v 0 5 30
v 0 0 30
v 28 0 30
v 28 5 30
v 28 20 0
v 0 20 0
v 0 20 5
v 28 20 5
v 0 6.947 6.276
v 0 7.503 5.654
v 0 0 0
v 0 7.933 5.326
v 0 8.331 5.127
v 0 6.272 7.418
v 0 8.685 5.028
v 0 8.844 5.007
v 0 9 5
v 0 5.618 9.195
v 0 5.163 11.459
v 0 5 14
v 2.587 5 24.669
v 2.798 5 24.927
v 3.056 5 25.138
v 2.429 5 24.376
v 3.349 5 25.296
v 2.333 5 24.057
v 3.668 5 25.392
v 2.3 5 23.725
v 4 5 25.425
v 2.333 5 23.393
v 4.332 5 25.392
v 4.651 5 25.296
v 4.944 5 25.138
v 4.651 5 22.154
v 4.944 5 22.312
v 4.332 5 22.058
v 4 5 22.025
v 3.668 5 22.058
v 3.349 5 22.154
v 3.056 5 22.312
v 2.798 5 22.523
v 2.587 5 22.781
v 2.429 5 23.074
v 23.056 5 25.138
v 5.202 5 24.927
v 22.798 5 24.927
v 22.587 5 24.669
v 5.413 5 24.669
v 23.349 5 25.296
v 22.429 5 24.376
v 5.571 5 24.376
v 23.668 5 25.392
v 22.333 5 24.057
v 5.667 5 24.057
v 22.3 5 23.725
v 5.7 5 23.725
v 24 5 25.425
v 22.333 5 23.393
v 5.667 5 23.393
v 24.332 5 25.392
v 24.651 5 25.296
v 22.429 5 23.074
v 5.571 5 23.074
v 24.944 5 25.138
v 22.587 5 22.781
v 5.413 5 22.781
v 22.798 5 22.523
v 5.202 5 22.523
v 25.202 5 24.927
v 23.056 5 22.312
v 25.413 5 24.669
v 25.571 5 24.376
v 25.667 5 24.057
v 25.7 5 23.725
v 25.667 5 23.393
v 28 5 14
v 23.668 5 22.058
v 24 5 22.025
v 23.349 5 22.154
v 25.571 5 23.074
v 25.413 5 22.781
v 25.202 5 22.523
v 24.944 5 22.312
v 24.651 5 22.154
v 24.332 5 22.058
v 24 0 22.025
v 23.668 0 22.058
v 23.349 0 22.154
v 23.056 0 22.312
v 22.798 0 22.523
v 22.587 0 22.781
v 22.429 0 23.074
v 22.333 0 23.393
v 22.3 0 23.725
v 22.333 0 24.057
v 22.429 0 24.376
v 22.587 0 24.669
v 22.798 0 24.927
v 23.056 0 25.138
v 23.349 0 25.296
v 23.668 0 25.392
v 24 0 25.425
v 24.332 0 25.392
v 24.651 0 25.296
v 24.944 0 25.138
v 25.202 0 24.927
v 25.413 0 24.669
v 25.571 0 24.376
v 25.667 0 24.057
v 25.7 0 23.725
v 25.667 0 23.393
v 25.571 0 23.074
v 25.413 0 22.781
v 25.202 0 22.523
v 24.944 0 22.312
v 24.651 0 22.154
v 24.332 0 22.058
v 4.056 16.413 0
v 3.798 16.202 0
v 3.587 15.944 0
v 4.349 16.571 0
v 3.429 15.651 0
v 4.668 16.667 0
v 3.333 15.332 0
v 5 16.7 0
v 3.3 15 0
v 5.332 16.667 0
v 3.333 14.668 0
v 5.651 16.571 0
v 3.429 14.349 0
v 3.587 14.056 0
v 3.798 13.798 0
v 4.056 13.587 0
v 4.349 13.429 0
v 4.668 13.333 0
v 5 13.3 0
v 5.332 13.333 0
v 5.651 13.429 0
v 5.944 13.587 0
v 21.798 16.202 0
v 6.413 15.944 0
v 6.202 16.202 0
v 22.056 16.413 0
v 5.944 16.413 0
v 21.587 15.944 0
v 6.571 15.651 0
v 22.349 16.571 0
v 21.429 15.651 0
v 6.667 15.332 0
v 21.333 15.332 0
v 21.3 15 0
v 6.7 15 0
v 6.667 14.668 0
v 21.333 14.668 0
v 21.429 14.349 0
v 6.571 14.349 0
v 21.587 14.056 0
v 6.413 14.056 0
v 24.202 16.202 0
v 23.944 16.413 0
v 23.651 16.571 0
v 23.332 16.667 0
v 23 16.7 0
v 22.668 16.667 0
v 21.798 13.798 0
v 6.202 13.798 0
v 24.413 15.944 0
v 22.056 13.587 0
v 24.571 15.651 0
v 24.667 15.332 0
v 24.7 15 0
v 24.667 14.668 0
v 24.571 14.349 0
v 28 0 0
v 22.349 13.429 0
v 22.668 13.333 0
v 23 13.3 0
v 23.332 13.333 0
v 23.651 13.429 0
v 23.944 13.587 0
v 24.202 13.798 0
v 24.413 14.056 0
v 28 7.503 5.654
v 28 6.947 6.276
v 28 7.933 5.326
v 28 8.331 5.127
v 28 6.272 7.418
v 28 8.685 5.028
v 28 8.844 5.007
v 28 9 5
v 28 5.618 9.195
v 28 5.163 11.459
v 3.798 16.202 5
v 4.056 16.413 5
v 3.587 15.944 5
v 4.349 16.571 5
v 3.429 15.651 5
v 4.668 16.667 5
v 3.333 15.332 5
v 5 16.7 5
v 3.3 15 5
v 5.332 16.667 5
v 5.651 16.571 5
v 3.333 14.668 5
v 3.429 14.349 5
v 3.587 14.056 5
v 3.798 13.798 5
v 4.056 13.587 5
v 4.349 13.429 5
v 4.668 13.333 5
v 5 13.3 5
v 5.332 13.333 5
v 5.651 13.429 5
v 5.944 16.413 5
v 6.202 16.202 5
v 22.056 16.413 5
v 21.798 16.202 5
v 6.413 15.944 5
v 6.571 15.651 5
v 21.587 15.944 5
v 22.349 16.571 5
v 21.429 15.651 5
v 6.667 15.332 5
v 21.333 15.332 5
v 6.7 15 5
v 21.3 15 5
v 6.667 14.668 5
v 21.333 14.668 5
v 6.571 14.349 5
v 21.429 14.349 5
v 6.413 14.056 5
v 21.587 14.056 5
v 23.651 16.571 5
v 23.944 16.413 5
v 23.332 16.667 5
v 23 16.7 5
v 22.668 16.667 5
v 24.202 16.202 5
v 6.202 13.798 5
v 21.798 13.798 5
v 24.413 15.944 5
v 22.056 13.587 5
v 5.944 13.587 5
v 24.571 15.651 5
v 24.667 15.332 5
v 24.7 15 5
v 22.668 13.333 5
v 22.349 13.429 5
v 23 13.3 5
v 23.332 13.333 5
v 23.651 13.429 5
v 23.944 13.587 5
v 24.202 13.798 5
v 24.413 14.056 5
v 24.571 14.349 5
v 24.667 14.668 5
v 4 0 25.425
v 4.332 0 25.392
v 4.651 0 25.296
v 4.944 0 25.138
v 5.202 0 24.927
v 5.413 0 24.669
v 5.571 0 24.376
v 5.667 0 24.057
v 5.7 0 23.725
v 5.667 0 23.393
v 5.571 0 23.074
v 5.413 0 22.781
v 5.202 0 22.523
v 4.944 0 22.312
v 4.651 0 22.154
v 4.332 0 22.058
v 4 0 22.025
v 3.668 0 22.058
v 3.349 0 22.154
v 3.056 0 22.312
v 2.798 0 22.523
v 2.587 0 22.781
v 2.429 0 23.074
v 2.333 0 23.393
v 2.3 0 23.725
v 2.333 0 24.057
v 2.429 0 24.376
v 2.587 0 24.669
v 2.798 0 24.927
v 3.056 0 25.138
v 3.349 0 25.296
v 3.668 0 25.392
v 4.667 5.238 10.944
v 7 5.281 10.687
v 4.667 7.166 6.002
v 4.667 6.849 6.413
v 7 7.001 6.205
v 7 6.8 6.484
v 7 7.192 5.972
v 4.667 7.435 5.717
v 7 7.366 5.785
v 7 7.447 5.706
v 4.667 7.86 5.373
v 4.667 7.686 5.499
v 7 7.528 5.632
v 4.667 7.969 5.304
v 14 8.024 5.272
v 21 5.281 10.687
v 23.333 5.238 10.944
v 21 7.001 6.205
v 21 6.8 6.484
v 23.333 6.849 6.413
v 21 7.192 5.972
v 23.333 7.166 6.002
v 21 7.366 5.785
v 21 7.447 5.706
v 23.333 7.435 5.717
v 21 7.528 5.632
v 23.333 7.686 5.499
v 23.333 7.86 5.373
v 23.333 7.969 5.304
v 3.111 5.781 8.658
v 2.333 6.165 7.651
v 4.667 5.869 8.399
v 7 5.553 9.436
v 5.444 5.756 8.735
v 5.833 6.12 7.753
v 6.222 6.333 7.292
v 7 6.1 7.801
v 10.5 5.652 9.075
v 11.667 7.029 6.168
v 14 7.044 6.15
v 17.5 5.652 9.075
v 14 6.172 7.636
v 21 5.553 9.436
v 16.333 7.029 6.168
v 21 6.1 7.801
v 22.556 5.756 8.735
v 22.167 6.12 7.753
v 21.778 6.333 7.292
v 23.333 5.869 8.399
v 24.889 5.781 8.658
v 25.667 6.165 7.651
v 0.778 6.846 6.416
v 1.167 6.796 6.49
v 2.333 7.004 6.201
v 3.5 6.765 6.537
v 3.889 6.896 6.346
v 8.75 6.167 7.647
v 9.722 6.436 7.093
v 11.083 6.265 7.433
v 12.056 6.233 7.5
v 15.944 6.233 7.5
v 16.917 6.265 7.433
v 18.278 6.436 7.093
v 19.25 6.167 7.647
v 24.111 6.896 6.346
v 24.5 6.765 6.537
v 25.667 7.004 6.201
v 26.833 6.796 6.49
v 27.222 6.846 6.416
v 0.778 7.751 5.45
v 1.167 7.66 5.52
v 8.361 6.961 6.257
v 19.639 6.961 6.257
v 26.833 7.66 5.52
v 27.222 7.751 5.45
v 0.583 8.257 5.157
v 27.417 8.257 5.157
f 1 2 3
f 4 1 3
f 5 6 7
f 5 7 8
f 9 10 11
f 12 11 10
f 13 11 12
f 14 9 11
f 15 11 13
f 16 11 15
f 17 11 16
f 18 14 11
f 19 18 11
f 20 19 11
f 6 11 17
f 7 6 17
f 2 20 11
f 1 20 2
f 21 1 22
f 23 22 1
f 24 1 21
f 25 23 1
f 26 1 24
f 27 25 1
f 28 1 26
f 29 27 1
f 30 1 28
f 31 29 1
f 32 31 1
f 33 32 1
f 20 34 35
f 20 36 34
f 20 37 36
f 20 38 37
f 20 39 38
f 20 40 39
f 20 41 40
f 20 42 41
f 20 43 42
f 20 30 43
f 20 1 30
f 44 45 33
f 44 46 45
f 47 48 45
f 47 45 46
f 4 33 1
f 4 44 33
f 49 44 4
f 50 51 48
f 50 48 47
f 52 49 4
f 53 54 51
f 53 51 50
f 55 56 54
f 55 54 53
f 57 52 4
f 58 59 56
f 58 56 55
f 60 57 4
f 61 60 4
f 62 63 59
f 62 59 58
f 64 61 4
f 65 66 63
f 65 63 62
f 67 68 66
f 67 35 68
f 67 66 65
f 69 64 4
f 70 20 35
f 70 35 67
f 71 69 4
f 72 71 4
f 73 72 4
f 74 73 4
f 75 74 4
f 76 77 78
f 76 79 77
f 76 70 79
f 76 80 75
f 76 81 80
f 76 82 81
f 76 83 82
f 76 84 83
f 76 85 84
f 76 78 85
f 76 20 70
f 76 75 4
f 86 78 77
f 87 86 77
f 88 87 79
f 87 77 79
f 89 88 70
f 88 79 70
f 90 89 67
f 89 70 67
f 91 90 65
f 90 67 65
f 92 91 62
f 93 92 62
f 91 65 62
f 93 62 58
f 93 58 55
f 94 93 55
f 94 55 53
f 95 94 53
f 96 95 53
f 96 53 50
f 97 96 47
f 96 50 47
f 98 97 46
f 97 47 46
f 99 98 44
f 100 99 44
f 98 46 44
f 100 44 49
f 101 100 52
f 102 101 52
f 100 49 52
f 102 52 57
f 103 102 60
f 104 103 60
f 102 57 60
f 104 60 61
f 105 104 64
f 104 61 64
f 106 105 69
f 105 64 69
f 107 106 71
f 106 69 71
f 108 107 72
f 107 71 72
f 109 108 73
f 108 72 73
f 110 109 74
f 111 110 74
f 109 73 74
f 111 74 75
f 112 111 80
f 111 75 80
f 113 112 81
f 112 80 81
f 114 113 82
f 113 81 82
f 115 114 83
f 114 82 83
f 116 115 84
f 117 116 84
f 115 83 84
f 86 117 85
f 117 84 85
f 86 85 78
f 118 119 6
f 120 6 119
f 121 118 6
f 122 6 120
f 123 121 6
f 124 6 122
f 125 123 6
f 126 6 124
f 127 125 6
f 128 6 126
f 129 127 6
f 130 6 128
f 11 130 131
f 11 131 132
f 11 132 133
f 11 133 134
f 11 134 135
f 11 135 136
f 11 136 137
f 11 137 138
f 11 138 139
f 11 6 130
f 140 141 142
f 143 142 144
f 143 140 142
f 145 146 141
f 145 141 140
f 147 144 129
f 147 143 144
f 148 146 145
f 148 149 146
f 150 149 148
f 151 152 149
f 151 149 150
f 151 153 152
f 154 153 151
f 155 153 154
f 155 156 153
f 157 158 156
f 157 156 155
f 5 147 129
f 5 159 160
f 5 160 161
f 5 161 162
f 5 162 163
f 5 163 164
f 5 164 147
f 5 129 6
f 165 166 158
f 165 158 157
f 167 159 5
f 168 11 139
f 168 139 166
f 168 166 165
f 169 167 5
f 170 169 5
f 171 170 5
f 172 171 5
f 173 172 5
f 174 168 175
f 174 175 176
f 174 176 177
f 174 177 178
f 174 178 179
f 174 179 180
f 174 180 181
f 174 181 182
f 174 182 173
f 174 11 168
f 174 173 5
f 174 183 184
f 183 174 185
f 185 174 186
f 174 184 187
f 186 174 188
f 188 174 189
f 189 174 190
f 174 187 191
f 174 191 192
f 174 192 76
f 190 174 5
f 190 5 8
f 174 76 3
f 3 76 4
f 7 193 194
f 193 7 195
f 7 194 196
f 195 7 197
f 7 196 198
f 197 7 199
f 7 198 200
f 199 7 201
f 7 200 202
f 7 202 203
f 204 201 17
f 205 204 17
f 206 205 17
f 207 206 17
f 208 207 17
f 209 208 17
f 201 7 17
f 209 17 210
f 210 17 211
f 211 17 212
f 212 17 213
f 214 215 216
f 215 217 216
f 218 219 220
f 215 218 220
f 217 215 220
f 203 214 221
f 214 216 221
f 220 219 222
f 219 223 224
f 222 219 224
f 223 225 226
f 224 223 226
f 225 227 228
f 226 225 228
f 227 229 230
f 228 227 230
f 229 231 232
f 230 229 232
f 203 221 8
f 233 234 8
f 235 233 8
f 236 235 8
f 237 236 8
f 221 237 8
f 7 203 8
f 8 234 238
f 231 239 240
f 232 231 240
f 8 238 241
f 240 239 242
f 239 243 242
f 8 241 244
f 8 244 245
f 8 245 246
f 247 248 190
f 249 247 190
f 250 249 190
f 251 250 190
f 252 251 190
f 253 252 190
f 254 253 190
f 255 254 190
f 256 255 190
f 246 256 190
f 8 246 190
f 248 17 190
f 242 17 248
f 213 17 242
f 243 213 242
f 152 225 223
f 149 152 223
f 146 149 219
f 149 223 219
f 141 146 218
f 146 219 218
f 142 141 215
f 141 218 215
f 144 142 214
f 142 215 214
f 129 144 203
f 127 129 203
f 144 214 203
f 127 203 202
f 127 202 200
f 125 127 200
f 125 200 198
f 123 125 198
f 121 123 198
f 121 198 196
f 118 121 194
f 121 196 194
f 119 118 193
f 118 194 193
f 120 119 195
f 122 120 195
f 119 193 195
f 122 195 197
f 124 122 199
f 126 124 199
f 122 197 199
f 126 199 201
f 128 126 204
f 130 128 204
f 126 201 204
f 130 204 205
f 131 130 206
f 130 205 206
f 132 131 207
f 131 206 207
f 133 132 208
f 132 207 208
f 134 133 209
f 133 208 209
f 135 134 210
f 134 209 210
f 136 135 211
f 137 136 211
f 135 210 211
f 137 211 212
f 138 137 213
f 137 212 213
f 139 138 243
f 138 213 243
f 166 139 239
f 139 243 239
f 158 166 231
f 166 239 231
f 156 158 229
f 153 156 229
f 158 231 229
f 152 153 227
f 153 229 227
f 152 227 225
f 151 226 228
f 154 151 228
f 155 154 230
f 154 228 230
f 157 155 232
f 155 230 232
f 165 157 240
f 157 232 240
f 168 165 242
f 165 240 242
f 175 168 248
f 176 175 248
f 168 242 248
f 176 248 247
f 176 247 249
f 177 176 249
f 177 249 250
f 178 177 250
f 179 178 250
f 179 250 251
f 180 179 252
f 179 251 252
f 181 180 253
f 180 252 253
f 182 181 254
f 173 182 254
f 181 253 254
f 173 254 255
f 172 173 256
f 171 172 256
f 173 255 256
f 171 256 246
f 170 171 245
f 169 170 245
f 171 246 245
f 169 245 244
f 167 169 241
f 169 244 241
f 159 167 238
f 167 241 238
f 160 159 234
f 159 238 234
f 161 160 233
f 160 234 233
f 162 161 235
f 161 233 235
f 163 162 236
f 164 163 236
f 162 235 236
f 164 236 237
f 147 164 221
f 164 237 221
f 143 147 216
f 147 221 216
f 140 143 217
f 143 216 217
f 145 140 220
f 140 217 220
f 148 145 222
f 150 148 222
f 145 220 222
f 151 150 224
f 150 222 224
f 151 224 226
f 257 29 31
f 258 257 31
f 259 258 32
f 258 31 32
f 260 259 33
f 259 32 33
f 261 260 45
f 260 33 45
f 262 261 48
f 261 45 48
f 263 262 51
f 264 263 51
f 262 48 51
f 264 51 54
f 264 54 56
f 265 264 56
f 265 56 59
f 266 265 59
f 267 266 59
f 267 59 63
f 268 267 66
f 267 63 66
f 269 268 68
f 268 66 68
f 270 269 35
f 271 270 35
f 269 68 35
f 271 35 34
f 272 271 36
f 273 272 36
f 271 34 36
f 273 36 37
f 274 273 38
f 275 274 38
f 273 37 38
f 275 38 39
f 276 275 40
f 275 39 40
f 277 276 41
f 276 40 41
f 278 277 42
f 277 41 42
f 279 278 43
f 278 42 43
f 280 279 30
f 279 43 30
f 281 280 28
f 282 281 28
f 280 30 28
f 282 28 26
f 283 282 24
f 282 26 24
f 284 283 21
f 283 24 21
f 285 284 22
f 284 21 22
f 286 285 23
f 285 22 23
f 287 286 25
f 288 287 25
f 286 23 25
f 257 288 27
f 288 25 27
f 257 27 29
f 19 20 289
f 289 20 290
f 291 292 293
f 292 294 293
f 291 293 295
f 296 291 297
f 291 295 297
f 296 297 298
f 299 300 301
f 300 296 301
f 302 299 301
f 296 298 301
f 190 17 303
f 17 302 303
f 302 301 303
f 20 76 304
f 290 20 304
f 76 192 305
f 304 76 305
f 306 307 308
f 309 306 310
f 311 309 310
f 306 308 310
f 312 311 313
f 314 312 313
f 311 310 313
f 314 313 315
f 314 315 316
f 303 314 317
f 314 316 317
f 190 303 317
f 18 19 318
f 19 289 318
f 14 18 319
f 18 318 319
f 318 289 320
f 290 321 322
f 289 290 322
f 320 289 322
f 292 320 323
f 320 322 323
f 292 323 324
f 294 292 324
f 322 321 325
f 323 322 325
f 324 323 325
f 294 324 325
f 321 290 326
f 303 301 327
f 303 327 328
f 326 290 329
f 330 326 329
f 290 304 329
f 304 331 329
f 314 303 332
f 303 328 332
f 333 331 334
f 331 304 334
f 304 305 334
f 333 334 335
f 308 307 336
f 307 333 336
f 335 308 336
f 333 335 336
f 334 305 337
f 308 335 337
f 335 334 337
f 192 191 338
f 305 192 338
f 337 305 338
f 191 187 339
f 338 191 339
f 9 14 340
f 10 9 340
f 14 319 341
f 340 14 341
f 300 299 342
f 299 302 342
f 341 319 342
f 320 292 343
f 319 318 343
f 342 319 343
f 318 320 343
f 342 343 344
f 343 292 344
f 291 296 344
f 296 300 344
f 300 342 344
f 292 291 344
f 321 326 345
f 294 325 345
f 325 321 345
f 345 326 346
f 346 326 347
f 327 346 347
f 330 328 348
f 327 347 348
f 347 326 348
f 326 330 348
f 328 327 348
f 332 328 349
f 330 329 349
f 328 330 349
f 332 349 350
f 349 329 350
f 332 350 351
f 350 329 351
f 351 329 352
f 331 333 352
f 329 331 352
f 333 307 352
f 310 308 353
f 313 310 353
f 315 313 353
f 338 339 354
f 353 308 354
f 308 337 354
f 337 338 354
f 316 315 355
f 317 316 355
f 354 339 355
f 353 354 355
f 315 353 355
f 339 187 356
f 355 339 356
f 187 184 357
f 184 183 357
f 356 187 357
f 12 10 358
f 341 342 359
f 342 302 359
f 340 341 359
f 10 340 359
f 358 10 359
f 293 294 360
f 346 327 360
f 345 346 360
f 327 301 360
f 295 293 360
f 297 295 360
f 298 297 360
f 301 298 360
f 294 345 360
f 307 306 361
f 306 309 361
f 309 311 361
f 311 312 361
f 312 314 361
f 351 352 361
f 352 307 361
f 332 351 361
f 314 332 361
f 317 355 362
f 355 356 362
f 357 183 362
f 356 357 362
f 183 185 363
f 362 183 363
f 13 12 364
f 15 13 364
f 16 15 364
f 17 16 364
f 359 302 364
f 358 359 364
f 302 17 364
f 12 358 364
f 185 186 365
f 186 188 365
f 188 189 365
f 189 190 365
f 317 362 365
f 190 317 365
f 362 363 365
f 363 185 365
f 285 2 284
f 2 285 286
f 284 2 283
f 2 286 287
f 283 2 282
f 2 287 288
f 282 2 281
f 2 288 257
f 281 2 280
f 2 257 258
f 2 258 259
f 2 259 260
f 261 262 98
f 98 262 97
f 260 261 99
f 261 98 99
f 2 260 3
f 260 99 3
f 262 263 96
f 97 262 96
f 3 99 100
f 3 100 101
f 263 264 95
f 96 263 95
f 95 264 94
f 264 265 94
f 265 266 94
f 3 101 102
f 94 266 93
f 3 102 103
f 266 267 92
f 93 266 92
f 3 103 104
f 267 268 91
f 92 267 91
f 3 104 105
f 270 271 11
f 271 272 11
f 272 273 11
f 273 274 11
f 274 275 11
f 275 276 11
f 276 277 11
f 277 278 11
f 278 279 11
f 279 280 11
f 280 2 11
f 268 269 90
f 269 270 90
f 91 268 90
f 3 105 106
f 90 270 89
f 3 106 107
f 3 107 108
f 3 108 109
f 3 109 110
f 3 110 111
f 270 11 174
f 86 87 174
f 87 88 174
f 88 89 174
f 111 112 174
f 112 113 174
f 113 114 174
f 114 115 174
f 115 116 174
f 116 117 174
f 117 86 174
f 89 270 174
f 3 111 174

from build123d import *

# Parameters (mm, degrees)
SKETCH_1_W          = 28
SKETCH_1_H          = 30
EXTRUDE_1_DEPTH     = 5
SKETCH_2_W          = 28
SKETCH_2_H          = 5
EXTRUDE_2_DEPTH     = 15
SKETCH_3_R          = 1.7
CUT_EXTRUDE_1_DEPTH = 5
SKETCH_4_R          = 1.7
CUT_EXTRUDE_2_DEPTH = 5
FILLET_1_SIZE       = 9
FILLET_1_SIZE_2     = 4


with BuildPart() as part:
    # 草图1 → 凸台-拉伸1 (new body)
    with BuildSketch(Plane(origin=(0, 0, 0), x_dir=(1, 0, 0), z_dir=(0, 1, 0))):
        with Locations((14, -15)):
            Rectangle(SKETCH_1_W, SKETCH_1_H)
    extrude(amount=EXTRUDE_1_DEPTH)

    # 草图2 → 凸台-拉伸2 (add)
    with BuildSketch(Plane(origin=(0, 5, 0), x_dir=(1, 0, 0), z_dir=(0, 1, 0))):
        with Locations((14, -2.5)):
            Rectangle(SKETCH_2_W, SKETCH_2_H)
    extrude(amount=EXTRUDE_2_DEPTH)

    # 草图3 → 切除-拉伸1 (cut)
    with BuildSketch(Plane(origin=(0, 5, 0), x_dir=(1, 0, 0), z_dir=(0, 1, 0))):
        with Locations(Location((4, -23.725, 0), (0, 0, 270))):
            Circle(SKETCH_3_R)
        with Locations(Location((24, -23.725, 0), (0, 0, 90))):
            Circle(SKETCH_3_R)
    extrude(amount=-CUT_EXTRUDE_1_DEPTH, mode=Mode.SUBTRACT)

    # 草图4 → 切除-拉伸2 (cut)
    with BuildSketch(Plane.XY.offset(5)):
        with Locations((5, 15)):
            Circle(SKETCH_4_R)
        with Locations(Location((23, 15, 0), (0, 0, 180))):
            Circle(SKETCH_4_R)
    extrude(amount=-CUT_EXTRUDE_2_DEPTH, mode=Mode.SUBTRACT)

    # 圆角1
    # an asymmetric fillet: 9, 4 mm, written as the material it adds along each edge
    with BuildSketch(Plane(origin=(28, 5, 5), x_dir=(0, 0, 1), z_dir=(-1, 0, 0))) as fillet_1_piece_1:
        with BuildLine():
            Bezier((FILLET_1_SIZE, 0), (0, 0), (0, FILLET_1_SIZE_2), weights=[1, 0.707106781, 1])
            Line((0, FILLET_1_SIZE_2), (0, 0))
            Line((0, 0), (FILLET_1_SIZE, 0))
        make_face()
    extrude(amount=28)


solid = part.part
